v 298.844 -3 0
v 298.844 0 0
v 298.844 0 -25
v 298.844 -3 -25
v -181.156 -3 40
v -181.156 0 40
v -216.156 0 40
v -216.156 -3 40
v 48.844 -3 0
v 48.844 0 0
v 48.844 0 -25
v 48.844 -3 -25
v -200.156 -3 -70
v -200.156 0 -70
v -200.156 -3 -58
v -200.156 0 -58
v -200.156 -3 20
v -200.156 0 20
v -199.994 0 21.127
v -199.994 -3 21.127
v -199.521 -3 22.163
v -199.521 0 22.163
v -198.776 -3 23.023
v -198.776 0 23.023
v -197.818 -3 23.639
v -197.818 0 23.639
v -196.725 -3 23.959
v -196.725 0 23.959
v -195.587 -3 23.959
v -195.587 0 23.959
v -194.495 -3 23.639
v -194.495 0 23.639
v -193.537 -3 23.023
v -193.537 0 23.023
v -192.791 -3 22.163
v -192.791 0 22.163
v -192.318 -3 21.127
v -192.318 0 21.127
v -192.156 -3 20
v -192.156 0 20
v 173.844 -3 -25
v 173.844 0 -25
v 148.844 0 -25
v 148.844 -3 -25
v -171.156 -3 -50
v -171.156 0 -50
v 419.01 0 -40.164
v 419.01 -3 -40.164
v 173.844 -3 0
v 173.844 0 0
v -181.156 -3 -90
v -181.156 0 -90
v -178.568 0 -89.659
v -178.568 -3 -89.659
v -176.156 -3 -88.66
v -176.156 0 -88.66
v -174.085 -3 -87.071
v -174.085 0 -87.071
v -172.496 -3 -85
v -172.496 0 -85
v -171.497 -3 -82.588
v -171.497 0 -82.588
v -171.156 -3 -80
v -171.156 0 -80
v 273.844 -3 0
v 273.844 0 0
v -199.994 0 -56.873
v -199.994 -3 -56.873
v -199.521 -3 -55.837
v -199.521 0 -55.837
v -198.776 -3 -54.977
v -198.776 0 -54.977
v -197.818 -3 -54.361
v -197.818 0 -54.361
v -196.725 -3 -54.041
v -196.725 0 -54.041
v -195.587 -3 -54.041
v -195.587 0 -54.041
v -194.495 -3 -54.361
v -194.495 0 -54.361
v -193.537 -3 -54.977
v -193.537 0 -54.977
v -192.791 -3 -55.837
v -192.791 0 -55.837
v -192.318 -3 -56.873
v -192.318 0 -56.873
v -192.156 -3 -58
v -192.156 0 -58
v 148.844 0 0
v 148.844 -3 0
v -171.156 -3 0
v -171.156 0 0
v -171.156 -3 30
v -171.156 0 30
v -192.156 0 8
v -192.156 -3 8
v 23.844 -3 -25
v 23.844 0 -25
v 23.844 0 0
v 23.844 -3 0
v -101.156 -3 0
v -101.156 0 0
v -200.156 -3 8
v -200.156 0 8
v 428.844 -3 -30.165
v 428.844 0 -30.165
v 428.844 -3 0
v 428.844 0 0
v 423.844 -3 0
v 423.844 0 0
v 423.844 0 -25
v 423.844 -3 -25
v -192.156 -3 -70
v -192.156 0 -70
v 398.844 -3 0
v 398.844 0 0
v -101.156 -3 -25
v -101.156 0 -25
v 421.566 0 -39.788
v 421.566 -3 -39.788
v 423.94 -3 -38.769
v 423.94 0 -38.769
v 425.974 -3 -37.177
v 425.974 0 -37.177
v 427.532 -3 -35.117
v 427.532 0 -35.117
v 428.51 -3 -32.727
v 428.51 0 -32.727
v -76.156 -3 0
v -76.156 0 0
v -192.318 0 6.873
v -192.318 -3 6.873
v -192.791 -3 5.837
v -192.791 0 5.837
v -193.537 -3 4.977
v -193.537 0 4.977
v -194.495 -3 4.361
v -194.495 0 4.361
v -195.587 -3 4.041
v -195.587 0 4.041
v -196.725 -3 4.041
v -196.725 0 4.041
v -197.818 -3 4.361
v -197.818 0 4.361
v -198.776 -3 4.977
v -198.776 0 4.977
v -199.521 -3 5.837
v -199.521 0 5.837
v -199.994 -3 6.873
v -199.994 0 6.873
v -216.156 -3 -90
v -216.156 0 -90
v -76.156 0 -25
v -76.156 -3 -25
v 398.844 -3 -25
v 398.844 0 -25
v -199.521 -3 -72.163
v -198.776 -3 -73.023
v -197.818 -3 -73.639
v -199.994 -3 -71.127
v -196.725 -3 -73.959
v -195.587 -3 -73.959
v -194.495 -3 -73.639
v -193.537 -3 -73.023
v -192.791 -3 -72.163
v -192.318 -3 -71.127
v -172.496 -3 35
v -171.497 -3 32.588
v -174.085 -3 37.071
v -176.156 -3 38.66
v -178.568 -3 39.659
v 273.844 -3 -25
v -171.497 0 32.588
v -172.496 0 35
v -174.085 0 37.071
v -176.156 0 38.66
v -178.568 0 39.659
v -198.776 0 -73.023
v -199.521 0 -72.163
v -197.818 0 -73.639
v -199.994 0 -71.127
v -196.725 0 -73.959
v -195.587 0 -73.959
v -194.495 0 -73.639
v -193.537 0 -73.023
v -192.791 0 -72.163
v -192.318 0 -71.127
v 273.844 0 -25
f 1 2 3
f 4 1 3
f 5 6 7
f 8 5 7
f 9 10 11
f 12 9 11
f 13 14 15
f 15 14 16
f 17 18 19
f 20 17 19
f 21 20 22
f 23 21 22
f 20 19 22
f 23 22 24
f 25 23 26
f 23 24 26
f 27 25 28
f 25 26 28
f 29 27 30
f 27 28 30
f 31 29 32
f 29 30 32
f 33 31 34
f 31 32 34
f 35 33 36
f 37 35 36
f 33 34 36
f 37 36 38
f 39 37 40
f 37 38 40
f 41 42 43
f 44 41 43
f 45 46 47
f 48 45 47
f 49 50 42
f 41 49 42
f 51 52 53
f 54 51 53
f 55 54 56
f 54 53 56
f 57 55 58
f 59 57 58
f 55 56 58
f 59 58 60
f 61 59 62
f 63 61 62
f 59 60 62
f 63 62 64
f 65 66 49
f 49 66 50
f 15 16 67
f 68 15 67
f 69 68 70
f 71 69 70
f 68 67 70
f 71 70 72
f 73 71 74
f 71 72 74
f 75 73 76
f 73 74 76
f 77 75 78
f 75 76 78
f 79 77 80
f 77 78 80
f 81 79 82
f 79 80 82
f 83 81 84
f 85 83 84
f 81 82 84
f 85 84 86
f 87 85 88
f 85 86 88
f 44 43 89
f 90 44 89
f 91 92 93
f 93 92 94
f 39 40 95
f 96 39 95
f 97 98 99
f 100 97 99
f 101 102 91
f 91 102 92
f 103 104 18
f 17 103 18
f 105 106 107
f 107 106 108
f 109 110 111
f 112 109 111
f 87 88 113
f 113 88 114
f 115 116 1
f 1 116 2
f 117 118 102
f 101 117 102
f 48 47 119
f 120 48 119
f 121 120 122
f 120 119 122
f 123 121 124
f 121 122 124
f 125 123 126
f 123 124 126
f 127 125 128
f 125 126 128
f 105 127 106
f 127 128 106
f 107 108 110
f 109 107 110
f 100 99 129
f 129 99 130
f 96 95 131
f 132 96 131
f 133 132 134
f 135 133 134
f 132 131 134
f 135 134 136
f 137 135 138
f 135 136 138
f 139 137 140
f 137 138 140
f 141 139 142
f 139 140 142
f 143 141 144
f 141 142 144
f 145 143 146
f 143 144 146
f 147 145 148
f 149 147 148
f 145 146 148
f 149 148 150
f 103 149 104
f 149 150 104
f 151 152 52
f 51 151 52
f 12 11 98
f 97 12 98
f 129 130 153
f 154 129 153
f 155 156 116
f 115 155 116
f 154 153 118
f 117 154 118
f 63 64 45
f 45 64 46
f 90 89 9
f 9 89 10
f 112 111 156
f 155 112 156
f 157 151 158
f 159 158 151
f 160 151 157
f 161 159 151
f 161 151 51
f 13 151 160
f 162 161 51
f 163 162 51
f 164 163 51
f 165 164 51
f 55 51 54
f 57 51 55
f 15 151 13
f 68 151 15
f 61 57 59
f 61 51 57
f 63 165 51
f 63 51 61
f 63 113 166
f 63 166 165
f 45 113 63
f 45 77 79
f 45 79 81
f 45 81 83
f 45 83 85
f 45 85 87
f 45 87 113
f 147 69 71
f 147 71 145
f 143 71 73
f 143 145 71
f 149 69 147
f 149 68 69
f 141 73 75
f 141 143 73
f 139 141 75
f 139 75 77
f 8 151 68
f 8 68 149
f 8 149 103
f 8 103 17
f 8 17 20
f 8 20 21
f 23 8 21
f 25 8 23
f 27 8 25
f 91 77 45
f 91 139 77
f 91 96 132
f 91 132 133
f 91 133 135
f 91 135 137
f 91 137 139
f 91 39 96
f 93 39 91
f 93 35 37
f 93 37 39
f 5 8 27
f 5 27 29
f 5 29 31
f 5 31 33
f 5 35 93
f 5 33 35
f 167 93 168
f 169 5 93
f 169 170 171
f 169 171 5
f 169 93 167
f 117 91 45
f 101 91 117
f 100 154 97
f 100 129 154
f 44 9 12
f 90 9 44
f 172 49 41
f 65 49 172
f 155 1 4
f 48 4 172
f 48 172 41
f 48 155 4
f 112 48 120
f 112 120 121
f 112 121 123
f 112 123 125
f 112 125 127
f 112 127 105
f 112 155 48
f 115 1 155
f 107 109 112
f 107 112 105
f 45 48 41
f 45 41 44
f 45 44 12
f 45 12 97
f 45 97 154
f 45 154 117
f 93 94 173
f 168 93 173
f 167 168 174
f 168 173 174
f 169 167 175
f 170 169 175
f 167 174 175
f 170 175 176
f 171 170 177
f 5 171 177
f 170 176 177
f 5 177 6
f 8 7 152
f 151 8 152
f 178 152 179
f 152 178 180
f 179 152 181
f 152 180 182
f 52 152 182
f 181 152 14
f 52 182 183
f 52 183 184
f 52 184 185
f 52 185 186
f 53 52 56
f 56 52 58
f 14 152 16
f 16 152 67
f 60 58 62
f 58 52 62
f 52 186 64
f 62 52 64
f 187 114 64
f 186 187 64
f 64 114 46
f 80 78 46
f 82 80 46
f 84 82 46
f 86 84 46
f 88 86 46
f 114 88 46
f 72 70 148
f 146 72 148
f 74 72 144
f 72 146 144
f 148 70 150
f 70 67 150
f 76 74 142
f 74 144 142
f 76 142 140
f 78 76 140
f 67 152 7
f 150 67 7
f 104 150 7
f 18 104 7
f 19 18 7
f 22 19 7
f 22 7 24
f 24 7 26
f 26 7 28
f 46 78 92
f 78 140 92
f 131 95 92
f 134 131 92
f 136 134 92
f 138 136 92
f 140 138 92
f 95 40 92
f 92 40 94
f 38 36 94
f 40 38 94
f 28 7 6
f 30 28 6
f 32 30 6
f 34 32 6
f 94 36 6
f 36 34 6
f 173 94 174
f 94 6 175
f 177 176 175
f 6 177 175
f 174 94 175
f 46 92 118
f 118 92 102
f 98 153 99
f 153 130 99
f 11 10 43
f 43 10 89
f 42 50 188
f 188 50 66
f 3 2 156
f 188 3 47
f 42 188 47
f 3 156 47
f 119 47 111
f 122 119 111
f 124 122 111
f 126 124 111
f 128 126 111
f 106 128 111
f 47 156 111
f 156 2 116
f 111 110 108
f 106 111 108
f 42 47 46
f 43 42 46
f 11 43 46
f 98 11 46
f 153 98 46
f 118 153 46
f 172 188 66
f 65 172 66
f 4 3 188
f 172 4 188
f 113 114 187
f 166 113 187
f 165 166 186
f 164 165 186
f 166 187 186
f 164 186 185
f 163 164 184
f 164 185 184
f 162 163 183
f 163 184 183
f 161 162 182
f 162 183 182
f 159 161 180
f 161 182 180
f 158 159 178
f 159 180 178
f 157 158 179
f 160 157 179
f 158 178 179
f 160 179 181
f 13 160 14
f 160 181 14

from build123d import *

# Parameters (mm, degrees)
F1_DEPTH = 3


with BuildPart() as f1:
    # F0 (on Front) → F1 (new body)
    with BuildSketch(Plane.XZ):
        with BuildLine():
            Line((-171.156163, -50), (-171.156163, 0))
            Line((-171.156163, 0), (-171.156163, 30))
            ThreePointArc((-171.156163, 30), (-174.085096, 37.071068), (-181.156163, 40))
            Line((-181.156163, 40), (-216.156163, 40))
            Line((-216.156163, 40), (-216.156163, -90))
            Line((-216.156163, -90), (-181.156163, -90))
            ThreePointArc((-181.156163, -90), (-174.085096, -87.071068), (-171.156163, -80))
            Line((-171.156163, -80), (-171.156163, -50))
        make_face()
        with BuildLine():
            Line((-192.156163, -58), (-192.156163, -70))
            ThreePointArc((-192.156163, -70), (-196.156163, -74), (-200.156163, -70))
            Line((-200.156163, -70), (-200.156163, -58))
            ThreePointArc((-200.156163, -58), (-196.156163, -54), (-192.156163, -58))
        make_face(mode=Mode.SUBTRACT)
        with BuildLine():
            Line((-200.156163, 8), (-200.156163, 20))
            ThreePointArc((-200.156163, 20), (-196.156163, 24), (-192.156163, 20))
            Line((-192.156163, 20), (-192.156163, 8))
            ThreePointArc((-192.156163, 8), (-196.156163, 4), (-200.156163, 8))
        make_face(mode=Mode.SUBTRACT)
        with BuildLine():
            Line((-101.156163, 0), (-171.156163, 0))
            Line((-171.156163, 0), (-171.156163, -50))
            Line((-171.156163, -50), (419.01048, -40.163889))
            ThreePointArc((419.01048, -40.163889), (425.973578, -37.177181), (428.843837, -30.165278))
            Line((428.843837, -30.165278), (428.843837, 0))
            Line((428.843837, 0), (423.843837, 0))
            Line((423.843837, 0), (423.843837, -25))
            Line((423.843837, -25), (398.843837, -25))
            Line((398.843837, -25), (398.843837, 0))
            Line((398.843837, 0), (298.843837, 0))
            Line((298.843837, 0), (298.843837, -25))
            Line((298.843837, -25), (273.843837, -25))
            Line((273.843837, -25), (273.843837, 0))
            Line((273.843837, 0), (173.843837, 0))
            Line((173.843837, 0), (173.843837, -25))
            Line((173.843837, -25), (163.126186, -25))
            Line((163.126186, -25), (148.843837, -25))
            Line((148.843837, -25), (148.843837, 0))
            Line((148.843837, 0), (48.843837, 0))
            Line((48.843837, 0), (48.843837, -25))
            Line((48.843837, -25), (23.843837, -25))
            Line((23.843837, -25), (23.843837, 0))
            Line((23.843837, 0), (-76.156163, 0))
            Line((-76.156163, 0), (-76.156163, -25))
            Line((-76.156163, -25), (-101.156163, -25))
            Line((-101.156163, -25), (-101.156163, 0))
        make_face()
    extrude(amount=F1_DEPTH)


solid = f1.part
